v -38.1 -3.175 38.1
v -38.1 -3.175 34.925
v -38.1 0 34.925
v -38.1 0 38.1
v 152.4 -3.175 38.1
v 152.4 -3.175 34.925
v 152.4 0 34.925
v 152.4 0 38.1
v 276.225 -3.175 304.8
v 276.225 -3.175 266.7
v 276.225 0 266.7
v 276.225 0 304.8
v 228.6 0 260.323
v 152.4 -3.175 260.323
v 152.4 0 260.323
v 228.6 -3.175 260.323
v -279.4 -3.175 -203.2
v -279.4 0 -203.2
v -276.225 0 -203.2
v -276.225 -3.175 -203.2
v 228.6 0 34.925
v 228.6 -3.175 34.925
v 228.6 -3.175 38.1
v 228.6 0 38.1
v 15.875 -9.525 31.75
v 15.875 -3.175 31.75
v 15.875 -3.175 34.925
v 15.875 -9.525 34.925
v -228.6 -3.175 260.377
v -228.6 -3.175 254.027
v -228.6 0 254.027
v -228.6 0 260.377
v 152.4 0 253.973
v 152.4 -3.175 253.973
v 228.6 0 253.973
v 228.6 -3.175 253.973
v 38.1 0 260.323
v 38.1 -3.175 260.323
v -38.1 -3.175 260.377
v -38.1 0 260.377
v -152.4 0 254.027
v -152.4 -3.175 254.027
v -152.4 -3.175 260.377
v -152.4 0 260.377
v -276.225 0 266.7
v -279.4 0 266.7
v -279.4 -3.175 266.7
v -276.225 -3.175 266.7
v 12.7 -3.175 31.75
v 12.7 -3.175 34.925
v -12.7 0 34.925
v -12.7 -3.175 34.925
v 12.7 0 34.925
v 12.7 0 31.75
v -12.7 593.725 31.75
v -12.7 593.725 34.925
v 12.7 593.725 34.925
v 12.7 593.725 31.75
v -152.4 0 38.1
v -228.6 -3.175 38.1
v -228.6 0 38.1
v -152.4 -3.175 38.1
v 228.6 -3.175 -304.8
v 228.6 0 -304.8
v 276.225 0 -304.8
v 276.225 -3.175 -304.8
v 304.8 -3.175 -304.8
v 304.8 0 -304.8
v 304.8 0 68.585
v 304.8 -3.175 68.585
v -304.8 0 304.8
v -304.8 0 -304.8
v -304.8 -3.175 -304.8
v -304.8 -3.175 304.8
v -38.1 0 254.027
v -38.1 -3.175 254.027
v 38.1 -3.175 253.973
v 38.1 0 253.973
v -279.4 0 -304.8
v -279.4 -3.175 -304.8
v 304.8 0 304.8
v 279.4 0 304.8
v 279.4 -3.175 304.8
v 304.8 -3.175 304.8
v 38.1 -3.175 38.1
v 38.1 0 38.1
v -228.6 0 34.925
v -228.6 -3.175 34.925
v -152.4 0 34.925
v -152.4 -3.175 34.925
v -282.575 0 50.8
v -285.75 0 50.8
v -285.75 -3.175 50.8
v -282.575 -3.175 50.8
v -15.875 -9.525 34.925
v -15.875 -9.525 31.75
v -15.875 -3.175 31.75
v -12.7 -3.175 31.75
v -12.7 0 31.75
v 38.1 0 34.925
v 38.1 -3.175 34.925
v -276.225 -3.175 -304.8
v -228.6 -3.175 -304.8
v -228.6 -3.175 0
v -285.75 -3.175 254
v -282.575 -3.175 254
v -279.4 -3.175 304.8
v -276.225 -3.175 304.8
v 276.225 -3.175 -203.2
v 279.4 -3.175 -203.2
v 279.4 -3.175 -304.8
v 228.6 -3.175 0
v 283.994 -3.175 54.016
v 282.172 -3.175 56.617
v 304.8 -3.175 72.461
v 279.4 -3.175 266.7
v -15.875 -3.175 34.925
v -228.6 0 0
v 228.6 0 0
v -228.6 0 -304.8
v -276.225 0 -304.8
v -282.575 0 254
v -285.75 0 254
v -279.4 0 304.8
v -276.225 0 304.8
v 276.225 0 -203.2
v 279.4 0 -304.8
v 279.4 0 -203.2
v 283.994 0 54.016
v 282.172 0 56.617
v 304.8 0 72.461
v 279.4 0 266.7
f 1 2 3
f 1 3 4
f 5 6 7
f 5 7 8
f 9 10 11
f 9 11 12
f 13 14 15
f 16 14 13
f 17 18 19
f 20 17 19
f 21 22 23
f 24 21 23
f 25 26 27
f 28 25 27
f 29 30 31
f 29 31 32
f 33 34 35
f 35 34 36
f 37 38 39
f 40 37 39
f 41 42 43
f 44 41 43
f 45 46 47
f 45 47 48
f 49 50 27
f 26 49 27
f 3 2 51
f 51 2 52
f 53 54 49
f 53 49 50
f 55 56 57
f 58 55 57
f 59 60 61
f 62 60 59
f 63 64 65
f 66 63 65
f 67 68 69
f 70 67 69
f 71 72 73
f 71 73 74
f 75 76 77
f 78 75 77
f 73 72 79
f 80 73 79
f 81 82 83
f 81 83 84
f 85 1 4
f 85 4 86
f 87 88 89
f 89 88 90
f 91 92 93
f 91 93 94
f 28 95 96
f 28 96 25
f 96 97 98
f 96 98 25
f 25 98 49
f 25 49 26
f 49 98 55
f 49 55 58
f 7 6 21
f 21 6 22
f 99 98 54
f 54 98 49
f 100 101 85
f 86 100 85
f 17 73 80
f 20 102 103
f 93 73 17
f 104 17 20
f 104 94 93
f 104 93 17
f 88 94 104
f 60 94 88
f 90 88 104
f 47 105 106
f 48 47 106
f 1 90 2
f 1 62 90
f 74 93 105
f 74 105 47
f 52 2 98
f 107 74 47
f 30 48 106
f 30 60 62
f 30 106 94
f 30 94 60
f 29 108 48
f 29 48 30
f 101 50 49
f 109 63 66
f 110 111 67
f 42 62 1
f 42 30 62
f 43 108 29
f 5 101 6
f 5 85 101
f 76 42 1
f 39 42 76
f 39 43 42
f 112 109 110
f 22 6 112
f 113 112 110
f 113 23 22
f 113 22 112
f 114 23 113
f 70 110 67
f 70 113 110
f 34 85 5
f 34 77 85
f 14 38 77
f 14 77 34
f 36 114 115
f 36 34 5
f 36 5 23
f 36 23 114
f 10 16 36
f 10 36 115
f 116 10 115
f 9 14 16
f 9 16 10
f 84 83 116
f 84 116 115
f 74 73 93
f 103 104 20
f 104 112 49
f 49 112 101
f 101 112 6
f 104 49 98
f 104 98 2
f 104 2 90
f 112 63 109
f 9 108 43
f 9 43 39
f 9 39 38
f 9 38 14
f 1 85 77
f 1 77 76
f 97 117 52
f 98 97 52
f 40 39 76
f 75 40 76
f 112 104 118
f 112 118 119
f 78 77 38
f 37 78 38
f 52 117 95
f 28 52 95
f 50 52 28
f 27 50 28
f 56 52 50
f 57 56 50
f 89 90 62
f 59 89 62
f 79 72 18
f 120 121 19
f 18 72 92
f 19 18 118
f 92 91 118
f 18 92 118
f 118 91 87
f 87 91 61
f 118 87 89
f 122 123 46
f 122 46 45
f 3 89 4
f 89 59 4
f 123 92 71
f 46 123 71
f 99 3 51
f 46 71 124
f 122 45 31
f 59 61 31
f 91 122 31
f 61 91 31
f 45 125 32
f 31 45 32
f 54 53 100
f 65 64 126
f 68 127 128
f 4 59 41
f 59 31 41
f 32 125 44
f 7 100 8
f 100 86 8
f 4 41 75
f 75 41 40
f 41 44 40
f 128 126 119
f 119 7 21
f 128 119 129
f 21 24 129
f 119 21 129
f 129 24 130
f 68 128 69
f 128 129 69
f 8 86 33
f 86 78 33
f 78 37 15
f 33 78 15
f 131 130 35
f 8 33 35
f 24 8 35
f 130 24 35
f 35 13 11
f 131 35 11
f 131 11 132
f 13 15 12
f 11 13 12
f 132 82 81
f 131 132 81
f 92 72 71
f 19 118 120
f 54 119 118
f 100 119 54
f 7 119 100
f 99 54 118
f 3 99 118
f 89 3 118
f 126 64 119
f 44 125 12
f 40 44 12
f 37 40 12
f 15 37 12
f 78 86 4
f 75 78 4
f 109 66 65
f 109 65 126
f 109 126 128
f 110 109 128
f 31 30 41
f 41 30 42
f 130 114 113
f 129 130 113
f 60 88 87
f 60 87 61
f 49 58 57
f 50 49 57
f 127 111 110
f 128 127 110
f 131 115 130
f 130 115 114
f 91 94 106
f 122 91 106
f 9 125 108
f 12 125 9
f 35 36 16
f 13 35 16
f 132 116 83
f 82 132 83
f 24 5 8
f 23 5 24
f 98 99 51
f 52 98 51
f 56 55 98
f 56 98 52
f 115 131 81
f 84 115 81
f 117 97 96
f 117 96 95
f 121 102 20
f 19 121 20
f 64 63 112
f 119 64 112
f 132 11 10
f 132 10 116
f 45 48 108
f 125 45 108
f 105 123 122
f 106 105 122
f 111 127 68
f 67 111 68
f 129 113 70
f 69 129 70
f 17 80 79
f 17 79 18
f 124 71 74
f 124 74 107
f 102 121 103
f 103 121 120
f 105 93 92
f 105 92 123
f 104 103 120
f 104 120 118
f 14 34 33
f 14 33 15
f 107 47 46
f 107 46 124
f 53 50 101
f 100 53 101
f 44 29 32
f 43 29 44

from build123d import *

# Parameters (mm, degrees)
F0_W      = 609.6
F0_H      = 609.6
F1_DEPTH  = 3.175
F2_W      = 457.2
F2_H      = 304.8
F2_W_2    = 3.175
F2_H_2    = 152.4
F2_W_3    = 76.2
F2_H_3    = 3.175
F2_H_4    = 6.35
F3_DEPTH  = 3.176
F4_W      = 3.175
F4_H      = 101.6
F5_DEPTH  = 3.176
F6_W      = 3.175
F6_H      = 203.2
F7_DEPTH  = 3.176
F8_W      = 25.4
F8_H      = 3.175
F9_DEPTH  = 3.176
F10_DEPTH = 596.9
F11_W     = 31.75
F11_H     = 3.175
F12_DEPTH = 6.35
F13_W     = 3.175
F13_H     = 114.3
F14_DEPTH = 3.175


with BuildPart() as f1:
    # F0 (on Front) → F1 (new body)
    with BuildSketch(Plane.XZ):
        Rectangle(F0_W, F0_H)
    extrude(amount=F1_DEPTH)

    # F2 (on face) → F3 (cut, through all)
    with BuildSketch(Plane.XZ.offset(3.175)):
        with Locations((0, -152.4)):
            Rectangle(F2_W, F2_H)
        with Locations((-277.8125, 228.6)):
            Rectangle(F2_W_2, F2_H_2)
        with Locations((277.8125, 228.6)):
            Rectangle(F2_W_2, F2_H_2)
        Polygon((283.9935380751, 54.0164299872), (304.8, 68.5852714705), (304.8, 72.4612307898), (282.1724328896, 56.6172377278), align=None)
        with Locations((-190.5, 36.5125)):
            Rectangle(F2_W_3, F2_H_3)
        with Locations((0, 36.5125)):
            Rectangle(F2_W_3, F2_H_3)
        with Locations((190.5, 36.5125)):
            Rectangle(F2_W_3, F2_H_3)
        Polygon((38.0999907298, 260.3234220437), (-38.0999907298, 260.3765779563), (-38.0999907298, 254.0265779563), (38.0999907298, 253.9734220437), align=None)
        with Locations((-190.4999907298, 257.2015779563)):
            Rectangle(F2_W_3, F2_H_4)
        with Locations((190.4999907298, 257.1484220437)):
            Rectangle(F2_W_3, F2_H_4)
    extrude(amount=-F3_DEPTH, mode=Mode.SUBTRACT)

    # F4 (on face) → F5 (cut, through all)
    with BuildSketch(Plane.XZ.offset(3.175)):
        with Locations((-277.8125, -254)):
            Rectangle(F4_W, F4_H)
        with Locations((277.8125, -254)):
            Rectangle(F4_W, F4_H)
    extrude(amount=-F5_DEPTH, mode=Mode.SUBTRACT)

    # F6 (on face) → F7 (cut, through all)
    with BuildSketch(Plane.XZ.offset(3.175)):
        with Locations((-284.1625, 152.4)):
            Rectangle(F6_W, F6_H)
    extrude(amount=-F7_DEPTH, mode=Mode.SUBTRACT)

    # F8 (on face) → F9 (cut, through all)
    with BuildSketch(Plane.XZ.offset(3.175)):
        with Locations((0, 33.3375)):
            Rectangle(F8_W, F8_H)
    extrude(amount=-F9_DEPTH, mode=Mode.SUBTRACT)

    # F13 (on face) → F14 (join)
    with BuildSketch(Plane.XZ.offset(3.175)):
        with Locations((-277.8125, 209.55)):
            Rectangle(F13_W, F13_H)
        with Locations((277.8125, 209.55)):
            Rectangle(F13_W, F13_H)
    extrude(amount=-F14_DEPTH)


with BuildPart() as f10:
    # F8 (on face) → F10 (new body)
    with BuildSketch(Plane.XZ.offset(3.175)):
        with Locations((0, 33.3375)):
            Rectangle(F8_W, F8_H)
    extrude(amount=-F10_DEPTH)

    # F11 (on face) → F12 (join)
    with BuildSketch(Plane.XZ.offset(3.175)):
        with Locations((0, 33.3375)):
            Rectangle(F11_W, F11_H)
    extrude(amount=F12_DEPTH)


solid = Compound([f1.part, f10.part])
